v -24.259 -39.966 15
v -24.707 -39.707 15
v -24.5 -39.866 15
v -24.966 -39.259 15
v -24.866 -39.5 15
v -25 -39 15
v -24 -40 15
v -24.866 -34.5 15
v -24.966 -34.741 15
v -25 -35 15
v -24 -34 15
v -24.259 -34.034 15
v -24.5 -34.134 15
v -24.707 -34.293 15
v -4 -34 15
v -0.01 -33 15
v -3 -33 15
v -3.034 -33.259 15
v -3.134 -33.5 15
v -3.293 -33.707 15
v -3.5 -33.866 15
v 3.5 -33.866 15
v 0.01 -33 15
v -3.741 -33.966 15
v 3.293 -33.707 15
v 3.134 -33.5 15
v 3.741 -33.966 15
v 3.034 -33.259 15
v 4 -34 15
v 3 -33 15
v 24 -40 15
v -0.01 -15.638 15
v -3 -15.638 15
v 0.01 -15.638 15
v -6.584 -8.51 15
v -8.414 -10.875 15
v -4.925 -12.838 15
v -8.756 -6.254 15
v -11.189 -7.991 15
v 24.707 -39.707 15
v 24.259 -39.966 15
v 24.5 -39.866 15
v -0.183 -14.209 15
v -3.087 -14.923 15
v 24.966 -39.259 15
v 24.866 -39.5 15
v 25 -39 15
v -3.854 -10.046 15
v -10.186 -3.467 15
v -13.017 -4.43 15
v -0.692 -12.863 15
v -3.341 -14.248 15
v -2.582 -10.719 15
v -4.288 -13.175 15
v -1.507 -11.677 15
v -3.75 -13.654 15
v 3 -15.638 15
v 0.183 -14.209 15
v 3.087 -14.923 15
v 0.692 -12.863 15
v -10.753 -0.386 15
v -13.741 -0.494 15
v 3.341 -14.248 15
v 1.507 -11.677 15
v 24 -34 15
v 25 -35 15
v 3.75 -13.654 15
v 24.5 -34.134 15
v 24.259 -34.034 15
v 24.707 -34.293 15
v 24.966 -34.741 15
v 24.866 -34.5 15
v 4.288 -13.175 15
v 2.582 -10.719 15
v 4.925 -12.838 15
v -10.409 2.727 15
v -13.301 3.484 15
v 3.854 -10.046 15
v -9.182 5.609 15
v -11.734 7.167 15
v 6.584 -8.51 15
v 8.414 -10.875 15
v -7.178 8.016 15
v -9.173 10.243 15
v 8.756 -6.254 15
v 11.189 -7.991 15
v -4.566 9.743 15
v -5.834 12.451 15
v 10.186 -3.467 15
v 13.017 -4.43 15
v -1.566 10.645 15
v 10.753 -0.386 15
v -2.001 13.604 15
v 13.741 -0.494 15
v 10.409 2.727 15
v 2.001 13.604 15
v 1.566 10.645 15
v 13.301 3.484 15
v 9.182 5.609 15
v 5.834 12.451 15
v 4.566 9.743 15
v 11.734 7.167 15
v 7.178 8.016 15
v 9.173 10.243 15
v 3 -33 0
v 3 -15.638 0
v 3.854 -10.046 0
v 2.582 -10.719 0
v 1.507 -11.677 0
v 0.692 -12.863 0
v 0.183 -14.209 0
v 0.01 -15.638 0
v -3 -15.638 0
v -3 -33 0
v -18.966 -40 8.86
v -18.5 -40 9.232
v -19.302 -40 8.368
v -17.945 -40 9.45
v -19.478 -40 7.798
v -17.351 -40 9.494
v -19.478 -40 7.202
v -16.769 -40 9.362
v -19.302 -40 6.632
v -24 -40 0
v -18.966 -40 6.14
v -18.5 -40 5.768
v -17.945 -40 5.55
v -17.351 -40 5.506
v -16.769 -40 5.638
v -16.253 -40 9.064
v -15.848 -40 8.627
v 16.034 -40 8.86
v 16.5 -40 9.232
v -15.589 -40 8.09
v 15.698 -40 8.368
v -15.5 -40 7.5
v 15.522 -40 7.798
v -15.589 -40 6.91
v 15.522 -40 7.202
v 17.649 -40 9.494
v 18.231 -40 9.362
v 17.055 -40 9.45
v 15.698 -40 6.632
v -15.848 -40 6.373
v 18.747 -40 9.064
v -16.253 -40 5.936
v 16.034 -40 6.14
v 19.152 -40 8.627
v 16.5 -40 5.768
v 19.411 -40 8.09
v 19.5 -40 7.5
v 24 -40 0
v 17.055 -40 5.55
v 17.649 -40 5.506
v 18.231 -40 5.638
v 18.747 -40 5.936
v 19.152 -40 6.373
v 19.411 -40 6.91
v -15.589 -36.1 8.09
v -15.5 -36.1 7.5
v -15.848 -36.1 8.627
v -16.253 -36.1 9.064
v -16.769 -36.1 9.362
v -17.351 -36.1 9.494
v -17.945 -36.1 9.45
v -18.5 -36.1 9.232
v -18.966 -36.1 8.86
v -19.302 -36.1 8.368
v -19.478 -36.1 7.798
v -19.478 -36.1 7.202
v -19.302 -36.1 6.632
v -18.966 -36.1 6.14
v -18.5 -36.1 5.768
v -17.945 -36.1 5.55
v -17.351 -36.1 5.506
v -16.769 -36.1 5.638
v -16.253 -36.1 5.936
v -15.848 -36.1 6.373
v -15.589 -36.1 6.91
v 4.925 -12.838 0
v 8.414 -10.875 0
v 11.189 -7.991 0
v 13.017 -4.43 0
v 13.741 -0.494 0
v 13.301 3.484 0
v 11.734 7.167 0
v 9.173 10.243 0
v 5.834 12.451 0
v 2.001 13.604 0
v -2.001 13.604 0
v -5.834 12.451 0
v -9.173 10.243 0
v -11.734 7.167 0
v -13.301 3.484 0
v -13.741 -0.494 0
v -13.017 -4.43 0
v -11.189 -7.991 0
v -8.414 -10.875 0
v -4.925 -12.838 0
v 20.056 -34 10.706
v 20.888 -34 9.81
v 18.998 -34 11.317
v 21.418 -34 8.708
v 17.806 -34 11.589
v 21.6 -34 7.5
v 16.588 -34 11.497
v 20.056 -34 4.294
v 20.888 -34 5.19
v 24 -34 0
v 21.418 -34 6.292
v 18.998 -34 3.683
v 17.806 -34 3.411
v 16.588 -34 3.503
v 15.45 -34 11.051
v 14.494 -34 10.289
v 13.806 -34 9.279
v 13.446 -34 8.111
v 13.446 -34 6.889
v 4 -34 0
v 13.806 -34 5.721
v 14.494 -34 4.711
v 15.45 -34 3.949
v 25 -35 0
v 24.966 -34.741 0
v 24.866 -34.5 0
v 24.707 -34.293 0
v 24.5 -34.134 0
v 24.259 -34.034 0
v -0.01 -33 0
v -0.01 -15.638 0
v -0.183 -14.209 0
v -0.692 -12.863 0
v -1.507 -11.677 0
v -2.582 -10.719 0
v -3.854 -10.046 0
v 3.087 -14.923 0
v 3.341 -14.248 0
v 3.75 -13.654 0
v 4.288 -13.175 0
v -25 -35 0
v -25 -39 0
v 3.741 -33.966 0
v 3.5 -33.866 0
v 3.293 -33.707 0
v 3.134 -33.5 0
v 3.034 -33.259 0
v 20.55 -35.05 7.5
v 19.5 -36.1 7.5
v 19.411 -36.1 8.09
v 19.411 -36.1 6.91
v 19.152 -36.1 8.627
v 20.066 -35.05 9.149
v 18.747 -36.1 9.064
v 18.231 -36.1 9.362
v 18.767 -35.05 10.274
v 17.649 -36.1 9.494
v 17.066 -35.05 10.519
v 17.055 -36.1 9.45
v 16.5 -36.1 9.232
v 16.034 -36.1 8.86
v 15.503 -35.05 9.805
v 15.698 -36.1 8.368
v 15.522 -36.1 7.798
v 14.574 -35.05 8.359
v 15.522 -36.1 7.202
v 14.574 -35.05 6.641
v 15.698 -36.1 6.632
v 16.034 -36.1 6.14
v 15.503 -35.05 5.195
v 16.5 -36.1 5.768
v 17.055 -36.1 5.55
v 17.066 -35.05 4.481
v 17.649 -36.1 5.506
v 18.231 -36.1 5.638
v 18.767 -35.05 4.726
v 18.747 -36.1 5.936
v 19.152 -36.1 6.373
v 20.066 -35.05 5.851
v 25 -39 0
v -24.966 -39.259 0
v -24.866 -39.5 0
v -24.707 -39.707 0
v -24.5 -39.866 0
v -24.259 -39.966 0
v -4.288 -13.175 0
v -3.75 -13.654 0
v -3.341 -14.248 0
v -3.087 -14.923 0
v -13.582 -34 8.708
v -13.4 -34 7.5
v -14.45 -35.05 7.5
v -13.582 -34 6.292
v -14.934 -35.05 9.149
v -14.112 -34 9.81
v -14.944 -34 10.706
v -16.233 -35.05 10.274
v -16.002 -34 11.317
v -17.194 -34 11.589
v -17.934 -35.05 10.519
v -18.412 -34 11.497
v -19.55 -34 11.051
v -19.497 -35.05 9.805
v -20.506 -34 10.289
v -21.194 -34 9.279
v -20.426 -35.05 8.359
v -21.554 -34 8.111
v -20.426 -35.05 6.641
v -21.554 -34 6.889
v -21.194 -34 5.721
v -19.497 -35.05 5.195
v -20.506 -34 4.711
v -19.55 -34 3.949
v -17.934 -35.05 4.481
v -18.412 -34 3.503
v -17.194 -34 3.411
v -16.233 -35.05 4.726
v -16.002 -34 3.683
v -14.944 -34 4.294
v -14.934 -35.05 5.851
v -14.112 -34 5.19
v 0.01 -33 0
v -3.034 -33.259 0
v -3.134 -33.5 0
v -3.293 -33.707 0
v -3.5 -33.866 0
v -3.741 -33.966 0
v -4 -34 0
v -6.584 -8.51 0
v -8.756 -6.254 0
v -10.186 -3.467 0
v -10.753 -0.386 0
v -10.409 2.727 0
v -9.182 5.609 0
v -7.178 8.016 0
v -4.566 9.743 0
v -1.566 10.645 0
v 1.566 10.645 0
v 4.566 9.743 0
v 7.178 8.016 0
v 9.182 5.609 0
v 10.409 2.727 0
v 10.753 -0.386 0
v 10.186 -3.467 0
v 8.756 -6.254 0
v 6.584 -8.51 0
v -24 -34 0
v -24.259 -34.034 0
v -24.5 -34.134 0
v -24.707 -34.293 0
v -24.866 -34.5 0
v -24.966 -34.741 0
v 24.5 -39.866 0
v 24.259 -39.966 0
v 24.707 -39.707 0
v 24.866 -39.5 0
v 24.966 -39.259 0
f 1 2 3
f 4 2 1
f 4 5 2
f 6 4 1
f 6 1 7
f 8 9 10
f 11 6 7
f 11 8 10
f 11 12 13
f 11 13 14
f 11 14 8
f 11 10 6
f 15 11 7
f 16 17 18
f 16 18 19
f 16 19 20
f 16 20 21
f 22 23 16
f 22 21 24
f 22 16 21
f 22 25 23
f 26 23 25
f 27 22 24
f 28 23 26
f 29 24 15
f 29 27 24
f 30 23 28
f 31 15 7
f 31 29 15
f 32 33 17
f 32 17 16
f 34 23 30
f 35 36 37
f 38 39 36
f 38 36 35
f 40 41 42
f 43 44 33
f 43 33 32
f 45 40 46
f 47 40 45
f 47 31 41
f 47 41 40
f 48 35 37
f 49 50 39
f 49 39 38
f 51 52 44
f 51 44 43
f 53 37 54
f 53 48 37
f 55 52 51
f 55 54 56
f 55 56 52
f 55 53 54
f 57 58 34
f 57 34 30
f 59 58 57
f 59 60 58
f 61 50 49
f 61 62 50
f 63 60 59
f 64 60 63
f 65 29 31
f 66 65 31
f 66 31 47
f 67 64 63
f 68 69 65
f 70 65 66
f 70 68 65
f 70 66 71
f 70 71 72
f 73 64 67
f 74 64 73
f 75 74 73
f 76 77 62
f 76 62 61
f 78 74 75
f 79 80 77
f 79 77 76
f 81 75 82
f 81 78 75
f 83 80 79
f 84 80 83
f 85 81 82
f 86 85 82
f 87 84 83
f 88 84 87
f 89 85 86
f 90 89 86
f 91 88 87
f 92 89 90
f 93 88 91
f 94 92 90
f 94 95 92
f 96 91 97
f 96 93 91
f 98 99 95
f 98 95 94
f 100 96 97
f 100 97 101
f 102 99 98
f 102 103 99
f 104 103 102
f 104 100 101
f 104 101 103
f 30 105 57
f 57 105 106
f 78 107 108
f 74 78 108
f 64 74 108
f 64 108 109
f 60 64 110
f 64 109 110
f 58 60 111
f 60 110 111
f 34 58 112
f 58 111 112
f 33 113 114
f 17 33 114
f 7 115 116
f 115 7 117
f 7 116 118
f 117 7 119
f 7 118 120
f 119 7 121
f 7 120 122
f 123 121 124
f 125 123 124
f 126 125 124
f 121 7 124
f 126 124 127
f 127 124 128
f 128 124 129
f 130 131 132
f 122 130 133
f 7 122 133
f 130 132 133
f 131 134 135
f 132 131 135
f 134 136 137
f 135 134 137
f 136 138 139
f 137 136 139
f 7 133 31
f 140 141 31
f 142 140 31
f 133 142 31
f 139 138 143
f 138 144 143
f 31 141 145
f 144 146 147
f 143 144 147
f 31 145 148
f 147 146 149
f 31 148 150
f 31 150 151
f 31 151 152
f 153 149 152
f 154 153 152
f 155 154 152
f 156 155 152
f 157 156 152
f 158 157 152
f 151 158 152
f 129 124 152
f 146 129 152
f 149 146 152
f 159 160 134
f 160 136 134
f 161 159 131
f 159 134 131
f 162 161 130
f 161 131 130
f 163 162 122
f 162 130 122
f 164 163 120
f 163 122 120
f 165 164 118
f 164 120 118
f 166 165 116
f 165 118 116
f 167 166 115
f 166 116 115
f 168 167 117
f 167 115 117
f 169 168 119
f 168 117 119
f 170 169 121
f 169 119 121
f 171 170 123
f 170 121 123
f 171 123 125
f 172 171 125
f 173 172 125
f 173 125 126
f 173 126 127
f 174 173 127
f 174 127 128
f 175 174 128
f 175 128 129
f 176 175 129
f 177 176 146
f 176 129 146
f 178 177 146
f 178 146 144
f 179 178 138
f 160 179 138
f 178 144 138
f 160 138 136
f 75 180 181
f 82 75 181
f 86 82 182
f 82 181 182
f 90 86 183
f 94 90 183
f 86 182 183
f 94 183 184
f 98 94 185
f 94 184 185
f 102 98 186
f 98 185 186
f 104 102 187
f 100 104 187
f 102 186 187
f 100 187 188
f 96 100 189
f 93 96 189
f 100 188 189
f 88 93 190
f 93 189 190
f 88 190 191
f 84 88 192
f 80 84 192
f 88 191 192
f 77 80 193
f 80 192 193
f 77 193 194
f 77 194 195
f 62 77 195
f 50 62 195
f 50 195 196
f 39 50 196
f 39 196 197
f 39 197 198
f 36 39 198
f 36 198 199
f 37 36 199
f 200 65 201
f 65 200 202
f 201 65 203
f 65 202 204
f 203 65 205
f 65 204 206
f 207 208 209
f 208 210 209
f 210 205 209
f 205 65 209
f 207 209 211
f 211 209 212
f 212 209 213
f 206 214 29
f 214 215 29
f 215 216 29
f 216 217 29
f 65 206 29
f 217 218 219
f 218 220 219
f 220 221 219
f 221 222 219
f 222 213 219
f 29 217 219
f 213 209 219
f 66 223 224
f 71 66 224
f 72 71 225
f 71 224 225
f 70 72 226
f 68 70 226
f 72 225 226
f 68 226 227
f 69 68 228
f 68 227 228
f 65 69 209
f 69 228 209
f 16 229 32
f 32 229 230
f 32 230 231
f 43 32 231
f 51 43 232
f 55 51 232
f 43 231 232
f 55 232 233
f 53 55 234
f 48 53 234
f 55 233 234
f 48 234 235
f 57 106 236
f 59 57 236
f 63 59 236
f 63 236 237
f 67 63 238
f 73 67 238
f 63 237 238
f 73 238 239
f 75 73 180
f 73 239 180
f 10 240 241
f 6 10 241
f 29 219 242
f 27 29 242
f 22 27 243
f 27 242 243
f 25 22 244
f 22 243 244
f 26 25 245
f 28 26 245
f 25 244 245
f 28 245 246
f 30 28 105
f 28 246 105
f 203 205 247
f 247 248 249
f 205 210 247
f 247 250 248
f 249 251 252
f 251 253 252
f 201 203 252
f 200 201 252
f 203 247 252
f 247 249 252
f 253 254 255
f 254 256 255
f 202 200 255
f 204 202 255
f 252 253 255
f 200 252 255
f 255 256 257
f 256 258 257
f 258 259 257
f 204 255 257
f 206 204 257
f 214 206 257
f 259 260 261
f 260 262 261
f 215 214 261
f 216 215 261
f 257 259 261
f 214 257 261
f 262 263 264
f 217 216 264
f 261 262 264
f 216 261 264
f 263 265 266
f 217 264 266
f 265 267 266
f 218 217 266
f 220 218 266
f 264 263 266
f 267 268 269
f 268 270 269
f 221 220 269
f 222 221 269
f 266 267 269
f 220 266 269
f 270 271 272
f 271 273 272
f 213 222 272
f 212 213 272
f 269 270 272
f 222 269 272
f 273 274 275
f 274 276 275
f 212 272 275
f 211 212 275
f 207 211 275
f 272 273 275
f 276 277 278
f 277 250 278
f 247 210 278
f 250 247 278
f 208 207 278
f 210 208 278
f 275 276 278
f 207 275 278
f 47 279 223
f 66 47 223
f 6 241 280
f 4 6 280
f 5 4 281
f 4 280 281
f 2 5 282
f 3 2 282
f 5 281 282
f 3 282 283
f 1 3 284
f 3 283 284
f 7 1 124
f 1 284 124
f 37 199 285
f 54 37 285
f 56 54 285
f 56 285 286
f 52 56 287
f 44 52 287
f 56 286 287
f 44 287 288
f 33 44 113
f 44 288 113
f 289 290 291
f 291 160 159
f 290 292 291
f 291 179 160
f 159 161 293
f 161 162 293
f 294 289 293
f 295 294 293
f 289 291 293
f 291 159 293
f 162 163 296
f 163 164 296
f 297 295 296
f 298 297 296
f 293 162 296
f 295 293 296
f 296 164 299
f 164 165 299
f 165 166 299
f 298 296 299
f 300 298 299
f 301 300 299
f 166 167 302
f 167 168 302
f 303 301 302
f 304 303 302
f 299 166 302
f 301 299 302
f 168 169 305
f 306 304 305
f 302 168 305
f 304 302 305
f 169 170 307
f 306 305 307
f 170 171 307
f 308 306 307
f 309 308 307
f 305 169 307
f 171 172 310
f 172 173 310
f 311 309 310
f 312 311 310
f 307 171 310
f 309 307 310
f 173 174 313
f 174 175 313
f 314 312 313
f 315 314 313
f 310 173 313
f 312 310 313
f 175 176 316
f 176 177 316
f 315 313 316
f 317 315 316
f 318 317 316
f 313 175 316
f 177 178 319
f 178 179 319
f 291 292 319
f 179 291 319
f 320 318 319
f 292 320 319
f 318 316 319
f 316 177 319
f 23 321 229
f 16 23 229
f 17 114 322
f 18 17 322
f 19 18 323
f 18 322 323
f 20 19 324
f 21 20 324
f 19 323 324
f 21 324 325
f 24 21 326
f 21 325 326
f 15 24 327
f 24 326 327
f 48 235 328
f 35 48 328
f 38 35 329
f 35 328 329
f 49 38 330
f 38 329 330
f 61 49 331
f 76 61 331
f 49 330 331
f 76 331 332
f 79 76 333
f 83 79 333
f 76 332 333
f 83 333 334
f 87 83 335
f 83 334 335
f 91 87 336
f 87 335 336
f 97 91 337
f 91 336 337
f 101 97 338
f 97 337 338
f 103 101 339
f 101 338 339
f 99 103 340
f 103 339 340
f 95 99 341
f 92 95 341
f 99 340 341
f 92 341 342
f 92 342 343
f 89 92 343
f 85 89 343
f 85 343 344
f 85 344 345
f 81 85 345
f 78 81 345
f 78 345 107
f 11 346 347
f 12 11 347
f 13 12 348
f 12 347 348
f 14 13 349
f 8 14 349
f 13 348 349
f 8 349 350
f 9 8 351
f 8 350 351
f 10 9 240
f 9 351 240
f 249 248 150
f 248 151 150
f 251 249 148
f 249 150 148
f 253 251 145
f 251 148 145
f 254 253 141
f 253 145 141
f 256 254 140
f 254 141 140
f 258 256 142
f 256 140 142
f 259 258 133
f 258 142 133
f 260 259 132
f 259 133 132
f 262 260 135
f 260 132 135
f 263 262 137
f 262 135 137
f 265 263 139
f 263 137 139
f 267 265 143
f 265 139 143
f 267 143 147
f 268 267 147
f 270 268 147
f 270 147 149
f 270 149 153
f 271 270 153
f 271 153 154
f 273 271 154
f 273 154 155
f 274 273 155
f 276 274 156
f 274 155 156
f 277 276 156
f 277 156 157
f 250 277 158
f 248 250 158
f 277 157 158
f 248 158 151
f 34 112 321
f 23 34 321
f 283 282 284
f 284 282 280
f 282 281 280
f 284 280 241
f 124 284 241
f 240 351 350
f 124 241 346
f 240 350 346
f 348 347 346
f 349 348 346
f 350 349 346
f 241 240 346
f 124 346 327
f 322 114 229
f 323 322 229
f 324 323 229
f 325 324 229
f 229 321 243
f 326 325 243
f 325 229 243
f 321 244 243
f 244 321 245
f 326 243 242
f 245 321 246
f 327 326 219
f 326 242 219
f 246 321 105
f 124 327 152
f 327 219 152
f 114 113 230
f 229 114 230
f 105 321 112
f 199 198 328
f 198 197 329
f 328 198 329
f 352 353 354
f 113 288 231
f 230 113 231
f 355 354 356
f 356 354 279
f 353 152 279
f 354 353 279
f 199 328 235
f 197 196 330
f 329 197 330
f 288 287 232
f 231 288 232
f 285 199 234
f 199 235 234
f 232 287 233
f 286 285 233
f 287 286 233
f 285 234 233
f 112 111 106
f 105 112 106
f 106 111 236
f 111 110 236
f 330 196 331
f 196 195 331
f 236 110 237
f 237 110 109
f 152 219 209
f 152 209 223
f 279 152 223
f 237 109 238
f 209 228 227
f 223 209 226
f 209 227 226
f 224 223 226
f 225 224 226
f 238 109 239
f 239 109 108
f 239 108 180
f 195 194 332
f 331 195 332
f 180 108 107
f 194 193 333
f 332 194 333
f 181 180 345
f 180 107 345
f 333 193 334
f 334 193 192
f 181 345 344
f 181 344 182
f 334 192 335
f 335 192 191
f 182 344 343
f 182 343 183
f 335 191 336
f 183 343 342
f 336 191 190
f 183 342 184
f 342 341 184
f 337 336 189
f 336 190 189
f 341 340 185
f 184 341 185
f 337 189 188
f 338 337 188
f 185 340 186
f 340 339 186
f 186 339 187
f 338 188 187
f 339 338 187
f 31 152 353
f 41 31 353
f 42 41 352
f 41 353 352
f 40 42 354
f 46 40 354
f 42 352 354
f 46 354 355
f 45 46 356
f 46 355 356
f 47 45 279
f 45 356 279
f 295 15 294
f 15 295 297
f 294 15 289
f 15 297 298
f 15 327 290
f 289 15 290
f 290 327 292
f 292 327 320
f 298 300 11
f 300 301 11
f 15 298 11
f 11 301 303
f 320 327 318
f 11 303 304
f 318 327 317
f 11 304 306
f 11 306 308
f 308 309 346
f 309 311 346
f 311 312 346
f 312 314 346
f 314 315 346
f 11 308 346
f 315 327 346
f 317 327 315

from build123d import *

# Parameters (mm, degrees)
F1_DEPTH       = 15
F3_D           = 4
F3_DEPTH       = 12
F3_CSINK_D     = 8.2
F3_CSINK_ANGLE = 90
F3_TIP         = 1.2017212381


with BuildPart() as f1:
    # F0 (on Top) → F1 (new body)
    with BuildSketch(Plane.XY):
        with BuildLine():
            ThreePointArc((3, -15.638494173), (3.5277661319, -13.9390649449), (4.9253731343, -12.8375698435))
            ThreePointArc((4.9253731343, -12.8375698435), (0, 13.75), (-4.9253731343, -12.8375698435))
            ThreePointArc((-4.9253731343, -12.8375698435), (-3.5277661319, -13.9390649449), (-3, -15.638494173))
            Line((-3, -15.638494173), (-3, -33))
            ThreePointArc((-3, -33), (-3.2928932188, -33.7071067812), (-4, -34))
            Line((-4, -34), (-24, -34))
            ThreePointArc((-24, -34), (-24.7071067812, -34.2928932188), (-25, -35))
            Line((-25, -35), (-25, -39))
            ThreePointArc((-25, -39), (-24.7071067812, -39.7071067812), (-24, -40))
            Line((-24, -40), (24, -40))
            ThreePointArc((24, -40), (24.7071067812, -39.7071067812), (25, -39))
            Line((25, -39), (25, -35))
            ThreePointArc((25, -35), (24.7071067812, -34.2928932188), (24, -34))
            Line((24, -34), (4, -34))
            ThreePointArc((4, -34), (3.2928932188, -33.7071067812), (3, -33))
            Line((3, -33), (3, -15.638494173))
        make_face()
        with BuildLine():
            ThreePointArc((-3.8543283582, -10.0459819285), (0, 10.76), (3.8543283582, -10.0459819285))
            ThreePointArc((3.8543283582, -10.0459819285), (1.0637730434, -12.2453004808), (0.01, -15.638494173))
            Line((0.01, -15.638494173), (0.01, -33))
            ThreePointArc((0.01, -33), (1.1786439431, -35.8213560569), (4, -36.99))
            Line((4, -36.99), (22.01, -36.99))
            Line((22.01, -36.99), (22.01, -37.01))
            Line((22.01, -37.01), (-22.01, -37.01))
            Line((-22.01, -37.01), (-22.01, -36.99))
            Line((-22.01, -36.99), (-4, -36.99))
            ThreePointArc((-4, -36.99), (-1.1786439431, -35.8213560569), (-0.01, -33))
            Line((-0.01, -33), (-0.01, -15.638494173))
            ThreePointArc((-0.01, -15.638494173), (-1.0637730434, -12.2453004808), (-3.8543283582, -10.0459819285))
        make_face(mode=Mode.SUBTRACT)
        with BuildLine():
            ThreePointArc((4, -36.99), (1.1786439431, -35.8213560569), (0.01, -33))
            Line((0.01, -33), (-0.01, -33))
            ThreePointArc((-0.01, -33), (-1.1786439431, -35.8213560569), (-4, -36.99))
            Line((-4, -36.99), (-22.01, -36.99))
            Line((-22.01, -36.99), (-22.01, -37.01))
            Line((-22.01, -37.01), (22.01, -37.01))
            Line((22.01, -37.01), (22.01, -36.99))
            Line((22.01, -36.99), (4, -36.99))
        make_face()
    extrude(amount=F1_DEPTH)

    # F3
    with Locations(Plane(origin=(0, -34, 0), x_dir=(-1, 0, 0), z_dir=(0, 1, 0))):
        with Locations((-17.5, 7.5), (17.5, 7.5)):
            CounterSinkHole(F3_D / 2, F3_CSINK_D / 2, depth=F3_DEPTH, counter_sink_angle=F3_CSINK_ANGLE)
            with Locations((0, 0, -(F3_DEPTH + F3_TIP / 2))):  # 118° drill point
                Cone(0, F3_D / 2, F3_TIP, mode=Mode.SUBTRACT)


solid = f1.part
